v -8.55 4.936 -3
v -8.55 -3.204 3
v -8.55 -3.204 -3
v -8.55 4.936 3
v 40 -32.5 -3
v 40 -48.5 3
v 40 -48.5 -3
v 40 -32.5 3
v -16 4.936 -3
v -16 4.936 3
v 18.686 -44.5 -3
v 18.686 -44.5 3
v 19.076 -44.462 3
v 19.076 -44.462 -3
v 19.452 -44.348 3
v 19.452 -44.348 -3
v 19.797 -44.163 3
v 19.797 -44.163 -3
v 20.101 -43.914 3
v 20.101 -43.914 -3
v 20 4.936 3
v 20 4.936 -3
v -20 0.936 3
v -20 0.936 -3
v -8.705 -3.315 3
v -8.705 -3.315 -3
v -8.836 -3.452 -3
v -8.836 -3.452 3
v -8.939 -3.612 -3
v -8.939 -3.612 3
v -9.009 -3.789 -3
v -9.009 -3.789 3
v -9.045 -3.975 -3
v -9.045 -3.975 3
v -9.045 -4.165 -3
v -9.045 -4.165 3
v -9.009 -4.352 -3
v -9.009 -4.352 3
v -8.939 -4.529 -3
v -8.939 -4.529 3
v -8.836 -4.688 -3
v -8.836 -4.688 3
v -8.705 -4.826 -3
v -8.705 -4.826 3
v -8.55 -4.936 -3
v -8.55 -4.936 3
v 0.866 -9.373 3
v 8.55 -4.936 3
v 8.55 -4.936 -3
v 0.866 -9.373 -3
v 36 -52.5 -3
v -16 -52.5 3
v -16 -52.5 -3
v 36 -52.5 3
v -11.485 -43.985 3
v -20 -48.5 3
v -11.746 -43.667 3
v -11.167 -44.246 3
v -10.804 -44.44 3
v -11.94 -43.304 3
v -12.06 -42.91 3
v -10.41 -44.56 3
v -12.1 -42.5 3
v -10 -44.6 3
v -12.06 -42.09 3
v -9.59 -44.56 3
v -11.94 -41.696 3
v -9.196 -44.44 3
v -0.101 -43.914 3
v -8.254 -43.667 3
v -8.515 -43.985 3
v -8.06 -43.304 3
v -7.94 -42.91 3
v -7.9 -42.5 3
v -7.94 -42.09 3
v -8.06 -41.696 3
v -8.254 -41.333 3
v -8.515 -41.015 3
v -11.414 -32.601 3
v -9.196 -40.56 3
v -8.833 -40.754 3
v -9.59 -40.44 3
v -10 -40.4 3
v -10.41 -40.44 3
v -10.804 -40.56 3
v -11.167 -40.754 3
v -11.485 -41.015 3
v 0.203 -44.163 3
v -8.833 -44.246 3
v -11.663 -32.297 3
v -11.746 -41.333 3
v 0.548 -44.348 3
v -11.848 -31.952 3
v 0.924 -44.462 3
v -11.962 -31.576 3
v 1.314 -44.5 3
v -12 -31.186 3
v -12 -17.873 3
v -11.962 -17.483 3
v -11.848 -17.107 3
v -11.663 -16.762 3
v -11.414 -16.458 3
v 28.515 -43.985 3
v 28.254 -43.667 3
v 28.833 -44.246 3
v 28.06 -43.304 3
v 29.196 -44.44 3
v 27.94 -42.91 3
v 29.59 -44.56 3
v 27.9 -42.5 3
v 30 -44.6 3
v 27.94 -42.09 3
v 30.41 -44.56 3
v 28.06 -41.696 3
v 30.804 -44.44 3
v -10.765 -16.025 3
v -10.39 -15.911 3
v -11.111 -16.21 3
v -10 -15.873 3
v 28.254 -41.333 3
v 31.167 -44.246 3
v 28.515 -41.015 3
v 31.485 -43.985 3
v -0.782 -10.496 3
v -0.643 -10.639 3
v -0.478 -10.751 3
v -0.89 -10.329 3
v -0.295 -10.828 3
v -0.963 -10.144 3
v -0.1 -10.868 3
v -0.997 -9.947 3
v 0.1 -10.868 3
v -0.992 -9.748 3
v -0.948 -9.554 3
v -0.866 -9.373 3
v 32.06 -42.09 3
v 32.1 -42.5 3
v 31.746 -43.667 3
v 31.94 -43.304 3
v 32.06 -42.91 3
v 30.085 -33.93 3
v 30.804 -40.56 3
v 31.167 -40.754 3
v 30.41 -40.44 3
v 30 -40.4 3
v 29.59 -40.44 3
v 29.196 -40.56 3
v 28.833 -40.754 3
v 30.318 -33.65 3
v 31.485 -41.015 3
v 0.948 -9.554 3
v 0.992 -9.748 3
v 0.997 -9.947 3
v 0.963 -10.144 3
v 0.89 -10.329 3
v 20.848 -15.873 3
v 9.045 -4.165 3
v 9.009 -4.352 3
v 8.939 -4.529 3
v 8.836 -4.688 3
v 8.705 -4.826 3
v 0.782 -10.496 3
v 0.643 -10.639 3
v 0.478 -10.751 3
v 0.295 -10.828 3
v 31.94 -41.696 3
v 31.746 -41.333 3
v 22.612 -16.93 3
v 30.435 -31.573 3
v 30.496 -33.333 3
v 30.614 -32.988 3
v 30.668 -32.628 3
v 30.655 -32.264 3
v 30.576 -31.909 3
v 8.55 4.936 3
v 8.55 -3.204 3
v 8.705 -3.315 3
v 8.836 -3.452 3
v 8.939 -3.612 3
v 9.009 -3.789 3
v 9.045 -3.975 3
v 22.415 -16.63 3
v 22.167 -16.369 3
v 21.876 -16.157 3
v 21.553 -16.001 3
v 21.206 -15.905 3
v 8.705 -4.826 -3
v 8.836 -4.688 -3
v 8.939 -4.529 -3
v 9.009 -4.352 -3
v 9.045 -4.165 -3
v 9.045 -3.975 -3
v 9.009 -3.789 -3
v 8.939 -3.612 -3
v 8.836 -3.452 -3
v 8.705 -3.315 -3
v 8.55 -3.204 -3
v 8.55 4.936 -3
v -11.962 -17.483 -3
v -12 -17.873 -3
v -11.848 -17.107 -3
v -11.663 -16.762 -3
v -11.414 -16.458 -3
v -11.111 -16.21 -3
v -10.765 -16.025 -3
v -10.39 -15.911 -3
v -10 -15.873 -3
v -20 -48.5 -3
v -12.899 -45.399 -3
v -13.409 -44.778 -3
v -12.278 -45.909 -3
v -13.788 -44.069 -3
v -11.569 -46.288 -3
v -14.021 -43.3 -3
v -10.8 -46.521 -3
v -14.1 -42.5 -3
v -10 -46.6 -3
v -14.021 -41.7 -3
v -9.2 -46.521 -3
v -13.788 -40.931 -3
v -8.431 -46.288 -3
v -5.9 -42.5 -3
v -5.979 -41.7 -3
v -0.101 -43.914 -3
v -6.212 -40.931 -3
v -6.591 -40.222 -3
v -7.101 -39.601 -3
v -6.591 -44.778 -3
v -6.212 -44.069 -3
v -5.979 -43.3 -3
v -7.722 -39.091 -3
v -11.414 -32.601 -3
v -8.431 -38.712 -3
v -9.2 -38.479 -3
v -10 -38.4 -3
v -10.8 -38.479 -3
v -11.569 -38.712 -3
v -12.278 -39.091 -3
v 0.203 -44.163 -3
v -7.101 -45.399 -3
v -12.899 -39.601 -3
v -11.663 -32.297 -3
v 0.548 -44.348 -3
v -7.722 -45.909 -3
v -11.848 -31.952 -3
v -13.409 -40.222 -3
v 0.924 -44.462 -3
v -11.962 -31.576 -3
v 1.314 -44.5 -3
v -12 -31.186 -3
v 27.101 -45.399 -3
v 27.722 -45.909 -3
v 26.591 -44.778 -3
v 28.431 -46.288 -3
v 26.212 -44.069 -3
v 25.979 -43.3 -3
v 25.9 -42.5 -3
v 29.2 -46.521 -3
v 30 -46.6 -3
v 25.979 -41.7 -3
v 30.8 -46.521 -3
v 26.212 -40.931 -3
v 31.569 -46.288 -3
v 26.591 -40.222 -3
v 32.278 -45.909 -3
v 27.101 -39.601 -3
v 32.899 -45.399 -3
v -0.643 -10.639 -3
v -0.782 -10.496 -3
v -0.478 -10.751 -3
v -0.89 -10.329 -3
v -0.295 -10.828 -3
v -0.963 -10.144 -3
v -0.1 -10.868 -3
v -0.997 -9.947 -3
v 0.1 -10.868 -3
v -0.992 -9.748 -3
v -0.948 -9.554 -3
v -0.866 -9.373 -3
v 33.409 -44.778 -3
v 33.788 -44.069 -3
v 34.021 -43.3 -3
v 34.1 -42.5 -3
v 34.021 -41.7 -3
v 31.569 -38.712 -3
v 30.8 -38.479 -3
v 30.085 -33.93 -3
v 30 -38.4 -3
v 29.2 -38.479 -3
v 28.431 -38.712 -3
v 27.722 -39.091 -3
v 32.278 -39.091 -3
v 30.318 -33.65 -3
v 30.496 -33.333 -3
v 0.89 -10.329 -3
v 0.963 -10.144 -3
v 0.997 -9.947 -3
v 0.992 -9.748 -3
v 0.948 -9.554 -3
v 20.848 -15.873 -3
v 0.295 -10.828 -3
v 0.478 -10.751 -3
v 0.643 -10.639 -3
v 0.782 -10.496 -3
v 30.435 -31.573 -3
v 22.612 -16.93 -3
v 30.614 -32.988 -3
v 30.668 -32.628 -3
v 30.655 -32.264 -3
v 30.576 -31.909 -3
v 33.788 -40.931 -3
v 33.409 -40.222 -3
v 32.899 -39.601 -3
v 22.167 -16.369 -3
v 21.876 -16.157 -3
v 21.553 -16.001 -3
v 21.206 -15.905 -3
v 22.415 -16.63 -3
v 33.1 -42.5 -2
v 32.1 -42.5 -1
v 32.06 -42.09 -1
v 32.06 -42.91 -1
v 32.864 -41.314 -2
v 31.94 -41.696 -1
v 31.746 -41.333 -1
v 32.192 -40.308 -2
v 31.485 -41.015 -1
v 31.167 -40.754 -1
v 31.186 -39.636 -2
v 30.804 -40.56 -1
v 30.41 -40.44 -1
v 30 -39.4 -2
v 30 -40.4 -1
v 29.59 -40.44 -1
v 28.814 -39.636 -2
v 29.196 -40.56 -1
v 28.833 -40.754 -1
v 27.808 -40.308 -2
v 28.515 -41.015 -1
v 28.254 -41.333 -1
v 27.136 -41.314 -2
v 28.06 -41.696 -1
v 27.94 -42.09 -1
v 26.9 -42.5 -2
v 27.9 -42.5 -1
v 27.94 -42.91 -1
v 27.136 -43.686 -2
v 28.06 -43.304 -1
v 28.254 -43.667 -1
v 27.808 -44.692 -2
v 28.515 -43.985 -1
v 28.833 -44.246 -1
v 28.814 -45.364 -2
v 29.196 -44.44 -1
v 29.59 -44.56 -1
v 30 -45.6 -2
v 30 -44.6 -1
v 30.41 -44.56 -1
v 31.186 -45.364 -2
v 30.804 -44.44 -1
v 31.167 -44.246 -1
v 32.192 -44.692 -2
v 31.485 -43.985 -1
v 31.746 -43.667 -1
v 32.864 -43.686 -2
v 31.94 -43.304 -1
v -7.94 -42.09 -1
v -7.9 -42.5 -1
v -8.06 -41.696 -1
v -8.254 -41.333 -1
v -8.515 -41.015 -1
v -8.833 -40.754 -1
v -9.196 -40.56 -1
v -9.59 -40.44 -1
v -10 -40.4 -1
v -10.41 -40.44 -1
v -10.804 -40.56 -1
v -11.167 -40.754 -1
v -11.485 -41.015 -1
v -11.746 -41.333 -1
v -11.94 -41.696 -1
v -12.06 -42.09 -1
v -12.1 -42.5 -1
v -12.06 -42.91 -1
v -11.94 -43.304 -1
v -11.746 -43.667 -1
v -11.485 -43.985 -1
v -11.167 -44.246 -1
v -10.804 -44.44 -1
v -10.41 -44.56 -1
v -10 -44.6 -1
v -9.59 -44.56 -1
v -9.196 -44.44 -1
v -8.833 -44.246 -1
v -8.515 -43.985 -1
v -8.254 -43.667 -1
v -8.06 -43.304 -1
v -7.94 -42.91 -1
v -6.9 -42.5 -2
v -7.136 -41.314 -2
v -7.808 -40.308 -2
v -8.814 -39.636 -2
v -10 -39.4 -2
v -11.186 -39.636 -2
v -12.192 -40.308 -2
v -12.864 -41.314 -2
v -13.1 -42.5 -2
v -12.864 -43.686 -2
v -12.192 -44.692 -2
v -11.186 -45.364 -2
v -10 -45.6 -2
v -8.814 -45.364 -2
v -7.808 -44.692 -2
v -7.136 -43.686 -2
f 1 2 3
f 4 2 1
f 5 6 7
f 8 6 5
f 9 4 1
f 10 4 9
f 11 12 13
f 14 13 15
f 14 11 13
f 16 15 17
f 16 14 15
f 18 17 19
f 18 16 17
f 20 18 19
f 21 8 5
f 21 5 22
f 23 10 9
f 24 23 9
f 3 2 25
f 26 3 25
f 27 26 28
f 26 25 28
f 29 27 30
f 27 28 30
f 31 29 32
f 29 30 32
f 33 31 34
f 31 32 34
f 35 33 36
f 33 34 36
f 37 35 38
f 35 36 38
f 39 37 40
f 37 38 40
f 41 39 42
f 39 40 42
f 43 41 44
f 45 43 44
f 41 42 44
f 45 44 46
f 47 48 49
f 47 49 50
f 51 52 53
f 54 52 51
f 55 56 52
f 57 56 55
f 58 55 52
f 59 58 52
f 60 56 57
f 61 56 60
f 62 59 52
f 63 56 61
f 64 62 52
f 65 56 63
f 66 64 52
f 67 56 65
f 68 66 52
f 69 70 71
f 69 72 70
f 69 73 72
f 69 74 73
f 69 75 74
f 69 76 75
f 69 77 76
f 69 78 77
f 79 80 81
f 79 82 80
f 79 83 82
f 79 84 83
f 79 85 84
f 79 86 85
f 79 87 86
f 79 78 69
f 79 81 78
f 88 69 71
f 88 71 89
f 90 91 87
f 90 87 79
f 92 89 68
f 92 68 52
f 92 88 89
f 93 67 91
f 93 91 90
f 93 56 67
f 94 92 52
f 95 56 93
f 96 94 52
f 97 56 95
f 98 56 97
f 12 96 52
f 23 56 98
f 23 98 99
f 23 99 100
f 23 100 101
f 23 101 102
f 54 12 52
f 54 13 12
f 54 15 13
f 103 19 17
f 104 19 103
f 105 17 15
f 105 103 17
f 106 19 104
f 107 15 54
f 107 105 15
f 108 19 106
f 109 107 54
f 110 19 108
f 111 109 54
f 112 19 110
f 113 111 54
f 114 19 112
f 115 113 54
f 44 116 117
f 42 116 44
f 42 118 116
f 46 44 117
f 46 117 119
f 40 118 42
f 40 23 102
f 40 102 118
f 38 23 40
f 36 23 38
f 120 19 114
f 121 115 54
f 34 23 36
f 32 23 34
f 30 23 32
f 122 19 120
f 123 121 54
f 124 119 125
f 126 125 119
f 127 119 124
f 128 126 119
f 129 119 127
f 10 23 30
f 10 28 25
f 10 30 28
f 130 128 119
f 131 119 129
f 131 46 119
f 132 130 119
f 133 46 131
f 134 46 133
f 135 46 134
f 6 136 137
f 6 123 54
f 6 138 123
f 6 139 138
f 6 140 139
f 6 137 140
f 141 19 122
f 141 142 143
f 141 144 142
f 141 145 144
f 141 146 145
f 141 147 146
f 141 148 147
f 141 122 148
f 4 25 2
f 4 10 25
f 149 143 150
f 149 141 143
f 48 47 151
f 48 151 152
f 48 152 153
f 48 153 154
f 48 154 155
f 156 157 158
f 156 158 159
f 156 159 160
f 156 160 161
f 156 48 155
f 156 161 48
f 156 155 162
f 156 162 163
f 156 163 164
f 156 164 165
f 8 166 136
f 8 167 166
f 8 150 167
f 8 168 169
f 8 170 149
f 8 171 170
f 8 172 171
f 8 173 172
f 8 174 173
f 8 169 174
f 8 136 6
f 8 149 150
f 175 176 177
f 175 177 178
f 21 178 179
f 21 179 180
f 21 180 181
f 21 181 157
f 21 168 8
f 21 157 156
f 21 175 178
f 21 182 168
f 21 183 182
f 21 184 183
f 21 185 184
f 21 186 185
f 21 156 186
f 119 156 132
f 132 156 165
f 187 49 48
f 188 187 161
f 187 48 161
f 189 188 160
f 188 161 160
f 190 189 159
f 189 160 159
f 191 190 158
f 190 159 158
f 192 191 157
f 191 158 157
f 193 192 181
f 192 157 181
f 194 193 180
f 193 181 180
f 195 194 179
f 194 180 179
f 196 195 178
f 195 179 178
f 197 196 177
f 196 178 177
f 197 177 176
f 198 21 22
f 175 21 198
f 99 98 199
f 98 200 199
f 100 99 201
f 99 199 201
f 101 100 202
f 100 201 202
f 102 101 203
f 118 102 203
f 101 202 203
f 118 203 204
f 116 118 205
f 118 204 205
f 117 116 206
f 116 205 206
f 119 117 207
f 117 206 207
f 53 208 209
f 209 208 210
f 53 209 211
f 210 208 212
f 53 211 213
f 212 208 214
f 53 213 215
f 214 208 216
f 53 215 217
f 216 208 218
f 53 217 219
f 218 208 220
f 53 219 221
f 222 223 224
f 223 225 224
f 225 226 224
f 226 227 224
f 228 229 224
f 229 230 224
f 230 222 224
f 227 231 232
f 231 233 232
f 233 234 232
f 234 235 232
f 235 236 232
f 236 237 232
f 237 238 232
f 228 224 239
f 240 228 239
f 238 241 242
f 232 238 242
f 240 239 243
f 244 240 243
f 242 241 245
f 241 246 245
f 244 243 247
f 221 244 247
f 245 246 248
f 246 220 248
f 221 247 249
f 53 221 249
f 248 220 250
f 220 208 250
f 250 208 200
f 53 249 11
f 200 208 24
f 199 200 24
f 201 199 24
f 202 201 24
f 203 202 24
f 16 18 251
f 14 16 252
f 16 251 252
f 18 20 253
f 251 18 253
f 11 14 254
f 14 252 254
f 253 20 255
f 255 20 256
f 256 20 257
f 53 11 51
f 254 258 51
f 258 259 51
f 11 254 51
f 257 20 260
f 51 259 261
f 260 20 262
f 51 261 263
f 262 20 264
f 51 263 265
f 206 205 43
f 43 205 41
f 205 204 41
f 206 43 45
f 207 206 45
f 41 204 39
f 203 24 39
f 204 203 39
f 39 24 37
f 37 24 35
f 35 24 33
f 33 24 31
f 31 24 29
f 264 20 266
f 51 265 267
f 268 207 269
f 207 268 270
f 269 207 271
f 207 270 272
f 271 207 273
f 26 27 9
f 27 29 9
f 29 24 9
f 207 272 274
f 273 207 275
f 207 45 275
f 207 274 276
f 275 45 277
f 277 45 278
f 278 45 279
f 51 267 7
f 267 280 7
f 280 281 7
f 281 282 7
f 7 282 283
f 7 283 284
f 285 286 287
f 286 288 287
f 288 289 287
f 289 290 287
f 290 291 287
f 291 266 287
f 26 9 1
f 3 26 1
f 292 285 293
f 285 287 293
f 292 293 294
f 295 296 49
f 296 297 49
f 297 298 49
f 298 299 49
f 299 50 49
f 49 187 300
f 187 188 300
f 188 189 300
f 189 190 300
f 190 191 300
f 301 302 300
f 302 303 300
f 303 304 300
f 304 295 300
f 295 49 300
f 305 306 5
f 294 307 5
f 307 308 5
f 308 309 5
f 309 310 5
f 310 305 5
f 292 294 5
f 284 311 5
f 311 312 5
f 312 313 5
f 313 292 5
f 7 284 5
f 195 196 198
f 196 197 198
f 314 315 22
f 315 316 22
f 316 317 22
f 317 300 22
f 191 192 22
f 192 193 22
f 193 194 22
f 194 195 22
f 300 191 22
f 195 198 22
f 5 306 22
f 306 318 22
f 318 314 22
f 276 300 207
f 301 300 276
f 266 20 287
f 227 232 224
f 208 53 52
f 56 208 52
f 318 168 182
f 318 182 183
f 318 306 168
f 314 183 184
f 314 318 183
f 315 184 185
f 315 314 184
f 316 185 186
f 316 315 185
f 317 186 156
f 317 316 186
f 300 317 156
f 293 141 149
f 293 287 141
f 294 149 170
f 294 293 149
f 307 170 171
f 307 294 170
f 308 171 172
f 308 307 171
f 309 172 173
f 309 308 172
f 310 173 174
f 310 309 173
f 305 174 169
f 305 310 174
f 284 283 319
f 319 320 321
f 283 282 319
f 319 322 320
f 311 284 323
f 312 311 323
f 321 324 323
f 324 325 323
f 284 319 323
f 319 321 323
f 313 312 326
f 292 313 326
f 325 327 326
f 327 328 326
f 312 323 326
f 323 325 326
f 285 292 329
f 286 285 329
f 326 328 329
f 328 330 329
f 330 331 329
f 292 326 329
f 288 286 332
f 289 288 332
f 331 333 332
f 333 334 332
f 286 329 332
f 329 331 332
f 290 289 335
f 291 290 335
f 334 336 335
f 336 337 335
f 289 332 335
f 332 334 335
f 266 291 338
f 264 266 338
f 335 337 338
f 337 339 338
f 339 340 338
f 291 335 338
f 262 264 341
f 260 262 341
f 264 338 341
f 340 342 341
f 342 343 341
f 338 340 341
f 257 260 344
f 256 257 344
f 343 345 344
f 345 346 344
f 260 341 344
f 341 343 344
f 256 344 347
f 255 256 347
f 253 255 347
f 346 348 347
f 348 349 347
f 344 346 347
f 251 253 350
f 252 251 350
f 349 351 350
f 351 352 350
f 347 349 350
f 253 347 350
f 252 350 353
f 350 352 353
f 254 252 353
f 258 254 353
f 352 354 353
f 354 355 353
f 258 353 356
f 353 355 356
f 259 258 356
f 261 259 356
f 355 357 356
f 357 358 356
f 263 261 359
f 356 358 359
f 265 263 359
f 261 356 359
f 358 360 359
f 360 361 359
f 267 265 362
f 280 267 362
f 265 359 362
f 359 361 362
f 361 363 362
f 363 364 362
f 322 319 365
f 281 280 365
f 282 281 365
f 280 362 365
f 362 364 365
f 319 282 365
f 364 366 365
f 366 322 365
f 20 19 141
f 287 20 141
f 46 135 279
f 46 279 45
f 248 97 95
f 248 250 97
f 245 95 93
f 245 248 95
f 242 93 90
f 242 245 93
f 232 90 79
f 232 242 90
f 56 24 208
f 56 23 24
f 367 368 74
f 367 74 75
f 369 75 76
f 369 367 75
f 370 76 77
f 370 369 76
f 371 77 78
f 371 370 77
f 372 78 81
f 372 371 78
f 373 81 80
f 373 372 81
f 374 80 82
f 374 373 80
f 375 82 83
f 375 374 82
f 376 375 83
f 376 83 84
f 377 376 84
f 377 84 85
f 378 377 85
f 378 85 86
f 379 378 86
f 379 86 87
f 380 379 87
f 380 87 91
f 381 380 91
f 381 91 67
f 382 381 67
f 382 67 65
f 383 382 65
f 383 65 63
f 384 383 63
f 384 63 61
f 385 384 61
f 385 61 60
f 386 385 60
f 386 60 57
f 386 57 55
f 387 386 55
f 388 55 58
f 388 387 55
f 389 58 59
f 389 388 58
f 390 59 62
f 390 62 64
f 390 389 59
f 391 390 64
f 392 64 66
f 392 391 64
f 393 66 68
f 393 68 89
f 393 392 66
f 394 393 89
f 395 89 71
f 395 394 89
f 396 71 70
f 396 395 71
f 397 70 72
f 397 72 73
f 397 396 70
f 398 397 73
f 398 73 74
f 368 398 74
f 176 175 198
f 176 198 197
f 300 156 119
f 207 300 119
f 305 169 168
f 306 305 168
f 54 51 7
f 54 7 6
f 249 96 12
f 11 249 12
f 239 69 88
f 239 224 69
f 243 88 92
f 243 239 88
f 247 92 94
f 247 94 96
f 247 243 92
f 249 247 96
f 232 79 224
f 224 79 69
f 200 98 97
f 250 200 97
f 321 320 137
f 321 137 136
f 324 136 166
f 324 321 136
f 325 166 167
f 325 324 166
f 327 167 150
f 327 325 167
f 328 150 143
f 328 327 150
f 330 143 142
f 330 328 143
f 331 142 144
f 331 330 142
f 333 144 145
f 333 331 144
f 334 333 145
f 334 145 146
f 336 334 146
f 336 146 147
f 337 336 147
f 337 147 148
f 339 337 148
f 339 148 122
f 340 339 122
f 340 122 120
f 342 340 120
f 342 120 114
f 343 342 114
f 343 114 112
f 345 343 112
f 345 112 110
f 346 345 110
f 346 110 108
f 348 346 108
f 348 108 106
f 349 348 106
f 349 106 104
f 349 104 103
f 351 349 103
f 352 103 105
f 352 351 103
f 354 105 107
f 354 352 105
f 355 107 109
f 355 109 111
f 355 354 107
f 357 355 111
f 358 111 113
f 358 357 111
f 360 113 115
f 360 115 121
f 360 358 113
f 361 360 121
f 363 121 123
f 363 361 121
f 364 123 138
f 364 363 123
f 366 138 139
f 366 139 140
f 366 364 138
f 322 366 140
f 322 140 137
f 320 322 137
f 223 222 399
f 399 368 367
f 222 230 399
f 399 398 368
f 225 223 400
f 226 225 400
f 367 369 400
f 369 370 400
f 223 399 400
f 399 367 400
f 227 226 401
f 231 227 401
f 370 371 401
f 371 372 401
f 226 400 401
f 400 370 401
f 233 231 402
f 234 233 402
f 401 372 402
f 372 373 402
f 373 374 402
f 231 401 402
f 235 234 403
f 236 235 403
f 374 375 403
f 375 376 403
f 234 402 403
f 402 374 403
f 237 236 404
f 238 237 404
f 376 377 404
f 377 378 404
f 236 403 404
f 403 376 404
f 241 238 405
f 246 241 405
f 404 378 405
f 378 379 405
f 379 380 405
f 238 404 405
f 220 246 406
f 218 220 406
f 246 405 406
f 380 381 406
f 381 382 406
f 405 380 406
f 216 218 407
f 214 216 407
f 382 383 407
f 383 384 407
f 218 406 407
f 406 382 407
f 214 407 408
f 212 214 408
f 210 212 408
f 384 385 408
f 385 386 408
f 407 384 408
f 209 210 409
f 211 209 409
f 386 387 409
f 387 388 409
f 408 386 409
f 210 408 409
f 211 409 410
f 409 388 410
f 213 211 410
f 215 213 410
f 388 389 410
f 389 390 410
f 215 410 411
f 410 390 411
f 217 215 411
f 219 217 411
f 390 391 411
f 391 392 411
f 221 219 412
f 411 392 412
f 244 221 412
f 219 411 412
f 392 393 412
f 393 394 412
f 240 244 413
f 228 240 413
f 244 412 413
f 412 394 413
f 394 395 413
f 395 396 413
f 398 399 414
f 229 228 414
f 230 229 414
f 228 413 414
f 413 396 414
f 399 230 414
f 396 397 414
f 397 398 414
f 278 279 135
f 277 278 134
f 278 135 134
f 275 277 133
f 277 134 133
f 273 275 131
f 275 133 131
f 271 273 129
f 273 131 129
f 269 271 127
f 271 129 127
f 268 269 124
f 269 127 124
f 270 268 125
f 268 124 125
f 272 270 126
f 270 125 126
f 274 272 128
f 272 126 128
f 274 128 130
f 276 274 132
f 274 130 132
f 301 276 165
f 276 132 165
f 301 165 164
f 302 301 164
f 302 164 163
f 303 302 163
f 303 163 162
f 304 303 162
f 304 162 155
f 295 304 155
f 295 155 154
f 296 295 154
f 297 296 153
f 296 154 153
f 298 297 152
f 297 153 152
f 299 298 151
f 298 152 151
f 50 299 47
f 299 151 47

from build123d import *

# Parameters (mm, degrees)
SKETCH_1_R          = 2.1
EXTRUDE_1_DEPTH     = 3
CHAMFER_1_SIZE      = 4
SKETCH_2_R          = 1
CUT_EXTRUDE_1_DEPTH = 67.274052238
CUT_EXTRUDE_2_DEPTH = 67.274052238
FILLET_1_R          = 2
CHAMFER_2_SIZE      = 2


with BuildPart() as part:
    # 草图1 → 凸台-拉伸1 (new, symmetric)
    with BuildSketch(Plane.XY):
        Polygon((-20, 4.936344802), (-20, -52.5), (40, -52.5), (40, -32.5), (20, 4.936344802), (8.55, 4.936344802), (8.55, -4.936344802), (0, -9.872689603), (-8.55, -4.936344802), (-8.55, 4.936344802), align=None)
        with Locations((-10, -42.5)):
            Circle(SKETCH_1_R, mode=Mode.SUBTRACT)
        with Locations((30, -42.5)):
            Circle(SKETCH_1_R, mode=Mode.SUBTRACT)
    extrude(amount=EXTRUDE_1_DEPTH, both=True)

    # 倒角1
    chamfer_1_edges = [part.edges().sort_by_distance(p)[0] for p in [
        (40, -52.5, 0),
        (-20, -52.5, 0),
        (-20, 4.936344802, 0),
    ]]
    chamfer(chamfer_1_edges, length=CHAMFER_1_SIZE)

    # 草图2 → 切除-拉伸1 (cut, through all)
    with BuildSketch(Plane.XY.offset(3)):
        with Locations((-8.05, -4.070319398)):
            Circle(SKETCH_2_R)
        with Locations((8.05, -4.070319398)):
            Circle(SKETCH_2_R)
        with Locations((0, -9.872689603)):
            Circle(SKETCH_2_R)
    extrude(amount=-CUT_EXTRUDE_1_DEPTH, mode=Mode.SUBTRACT)

    # 草图3 → 切除-拉伸2 (cut, through all)
    with BuildSketch(Plane.XY.offset(3)):
        Polygon((-12, -15.872689603), (-12, -32.014718626), (0.485281374, -44.5), (19.514718626, -44.5), (31.133551708, -32.881166917), (22.046939538, -15.872689603), align=None)
    extrude(amount=-CUT_EXTRUDE_2_DEPTH, mode=Mode.SUBTRACT)

    # 圆角1
    fillet_1_edges = [part.edges().sort_by_distance(p)[0] for p in [
        (-12, -15.872689603, 0),
        (22.046939538, -15.872689603, 0),
        (31.133551708, -32.881166917, 0),
        (19.514718626, -44.5, 0),
        (0.485281374, -44.5, 0),
        (-12, -32.014718626, 0),
    ]]
    fillet(fillet_1_edges, radius=FILLET_1_R)

    # 倒角2
    chamfer_2_edges = [part.edges().sort_by_distance(p)[0] for p in [
        (-12.1, -42.5, -3),
        (27.9, -42.5, -3),
    ]]
    chamfer(chamfer_2_edges, length=CHAMFER_2_SIZE)


solid = part.part
